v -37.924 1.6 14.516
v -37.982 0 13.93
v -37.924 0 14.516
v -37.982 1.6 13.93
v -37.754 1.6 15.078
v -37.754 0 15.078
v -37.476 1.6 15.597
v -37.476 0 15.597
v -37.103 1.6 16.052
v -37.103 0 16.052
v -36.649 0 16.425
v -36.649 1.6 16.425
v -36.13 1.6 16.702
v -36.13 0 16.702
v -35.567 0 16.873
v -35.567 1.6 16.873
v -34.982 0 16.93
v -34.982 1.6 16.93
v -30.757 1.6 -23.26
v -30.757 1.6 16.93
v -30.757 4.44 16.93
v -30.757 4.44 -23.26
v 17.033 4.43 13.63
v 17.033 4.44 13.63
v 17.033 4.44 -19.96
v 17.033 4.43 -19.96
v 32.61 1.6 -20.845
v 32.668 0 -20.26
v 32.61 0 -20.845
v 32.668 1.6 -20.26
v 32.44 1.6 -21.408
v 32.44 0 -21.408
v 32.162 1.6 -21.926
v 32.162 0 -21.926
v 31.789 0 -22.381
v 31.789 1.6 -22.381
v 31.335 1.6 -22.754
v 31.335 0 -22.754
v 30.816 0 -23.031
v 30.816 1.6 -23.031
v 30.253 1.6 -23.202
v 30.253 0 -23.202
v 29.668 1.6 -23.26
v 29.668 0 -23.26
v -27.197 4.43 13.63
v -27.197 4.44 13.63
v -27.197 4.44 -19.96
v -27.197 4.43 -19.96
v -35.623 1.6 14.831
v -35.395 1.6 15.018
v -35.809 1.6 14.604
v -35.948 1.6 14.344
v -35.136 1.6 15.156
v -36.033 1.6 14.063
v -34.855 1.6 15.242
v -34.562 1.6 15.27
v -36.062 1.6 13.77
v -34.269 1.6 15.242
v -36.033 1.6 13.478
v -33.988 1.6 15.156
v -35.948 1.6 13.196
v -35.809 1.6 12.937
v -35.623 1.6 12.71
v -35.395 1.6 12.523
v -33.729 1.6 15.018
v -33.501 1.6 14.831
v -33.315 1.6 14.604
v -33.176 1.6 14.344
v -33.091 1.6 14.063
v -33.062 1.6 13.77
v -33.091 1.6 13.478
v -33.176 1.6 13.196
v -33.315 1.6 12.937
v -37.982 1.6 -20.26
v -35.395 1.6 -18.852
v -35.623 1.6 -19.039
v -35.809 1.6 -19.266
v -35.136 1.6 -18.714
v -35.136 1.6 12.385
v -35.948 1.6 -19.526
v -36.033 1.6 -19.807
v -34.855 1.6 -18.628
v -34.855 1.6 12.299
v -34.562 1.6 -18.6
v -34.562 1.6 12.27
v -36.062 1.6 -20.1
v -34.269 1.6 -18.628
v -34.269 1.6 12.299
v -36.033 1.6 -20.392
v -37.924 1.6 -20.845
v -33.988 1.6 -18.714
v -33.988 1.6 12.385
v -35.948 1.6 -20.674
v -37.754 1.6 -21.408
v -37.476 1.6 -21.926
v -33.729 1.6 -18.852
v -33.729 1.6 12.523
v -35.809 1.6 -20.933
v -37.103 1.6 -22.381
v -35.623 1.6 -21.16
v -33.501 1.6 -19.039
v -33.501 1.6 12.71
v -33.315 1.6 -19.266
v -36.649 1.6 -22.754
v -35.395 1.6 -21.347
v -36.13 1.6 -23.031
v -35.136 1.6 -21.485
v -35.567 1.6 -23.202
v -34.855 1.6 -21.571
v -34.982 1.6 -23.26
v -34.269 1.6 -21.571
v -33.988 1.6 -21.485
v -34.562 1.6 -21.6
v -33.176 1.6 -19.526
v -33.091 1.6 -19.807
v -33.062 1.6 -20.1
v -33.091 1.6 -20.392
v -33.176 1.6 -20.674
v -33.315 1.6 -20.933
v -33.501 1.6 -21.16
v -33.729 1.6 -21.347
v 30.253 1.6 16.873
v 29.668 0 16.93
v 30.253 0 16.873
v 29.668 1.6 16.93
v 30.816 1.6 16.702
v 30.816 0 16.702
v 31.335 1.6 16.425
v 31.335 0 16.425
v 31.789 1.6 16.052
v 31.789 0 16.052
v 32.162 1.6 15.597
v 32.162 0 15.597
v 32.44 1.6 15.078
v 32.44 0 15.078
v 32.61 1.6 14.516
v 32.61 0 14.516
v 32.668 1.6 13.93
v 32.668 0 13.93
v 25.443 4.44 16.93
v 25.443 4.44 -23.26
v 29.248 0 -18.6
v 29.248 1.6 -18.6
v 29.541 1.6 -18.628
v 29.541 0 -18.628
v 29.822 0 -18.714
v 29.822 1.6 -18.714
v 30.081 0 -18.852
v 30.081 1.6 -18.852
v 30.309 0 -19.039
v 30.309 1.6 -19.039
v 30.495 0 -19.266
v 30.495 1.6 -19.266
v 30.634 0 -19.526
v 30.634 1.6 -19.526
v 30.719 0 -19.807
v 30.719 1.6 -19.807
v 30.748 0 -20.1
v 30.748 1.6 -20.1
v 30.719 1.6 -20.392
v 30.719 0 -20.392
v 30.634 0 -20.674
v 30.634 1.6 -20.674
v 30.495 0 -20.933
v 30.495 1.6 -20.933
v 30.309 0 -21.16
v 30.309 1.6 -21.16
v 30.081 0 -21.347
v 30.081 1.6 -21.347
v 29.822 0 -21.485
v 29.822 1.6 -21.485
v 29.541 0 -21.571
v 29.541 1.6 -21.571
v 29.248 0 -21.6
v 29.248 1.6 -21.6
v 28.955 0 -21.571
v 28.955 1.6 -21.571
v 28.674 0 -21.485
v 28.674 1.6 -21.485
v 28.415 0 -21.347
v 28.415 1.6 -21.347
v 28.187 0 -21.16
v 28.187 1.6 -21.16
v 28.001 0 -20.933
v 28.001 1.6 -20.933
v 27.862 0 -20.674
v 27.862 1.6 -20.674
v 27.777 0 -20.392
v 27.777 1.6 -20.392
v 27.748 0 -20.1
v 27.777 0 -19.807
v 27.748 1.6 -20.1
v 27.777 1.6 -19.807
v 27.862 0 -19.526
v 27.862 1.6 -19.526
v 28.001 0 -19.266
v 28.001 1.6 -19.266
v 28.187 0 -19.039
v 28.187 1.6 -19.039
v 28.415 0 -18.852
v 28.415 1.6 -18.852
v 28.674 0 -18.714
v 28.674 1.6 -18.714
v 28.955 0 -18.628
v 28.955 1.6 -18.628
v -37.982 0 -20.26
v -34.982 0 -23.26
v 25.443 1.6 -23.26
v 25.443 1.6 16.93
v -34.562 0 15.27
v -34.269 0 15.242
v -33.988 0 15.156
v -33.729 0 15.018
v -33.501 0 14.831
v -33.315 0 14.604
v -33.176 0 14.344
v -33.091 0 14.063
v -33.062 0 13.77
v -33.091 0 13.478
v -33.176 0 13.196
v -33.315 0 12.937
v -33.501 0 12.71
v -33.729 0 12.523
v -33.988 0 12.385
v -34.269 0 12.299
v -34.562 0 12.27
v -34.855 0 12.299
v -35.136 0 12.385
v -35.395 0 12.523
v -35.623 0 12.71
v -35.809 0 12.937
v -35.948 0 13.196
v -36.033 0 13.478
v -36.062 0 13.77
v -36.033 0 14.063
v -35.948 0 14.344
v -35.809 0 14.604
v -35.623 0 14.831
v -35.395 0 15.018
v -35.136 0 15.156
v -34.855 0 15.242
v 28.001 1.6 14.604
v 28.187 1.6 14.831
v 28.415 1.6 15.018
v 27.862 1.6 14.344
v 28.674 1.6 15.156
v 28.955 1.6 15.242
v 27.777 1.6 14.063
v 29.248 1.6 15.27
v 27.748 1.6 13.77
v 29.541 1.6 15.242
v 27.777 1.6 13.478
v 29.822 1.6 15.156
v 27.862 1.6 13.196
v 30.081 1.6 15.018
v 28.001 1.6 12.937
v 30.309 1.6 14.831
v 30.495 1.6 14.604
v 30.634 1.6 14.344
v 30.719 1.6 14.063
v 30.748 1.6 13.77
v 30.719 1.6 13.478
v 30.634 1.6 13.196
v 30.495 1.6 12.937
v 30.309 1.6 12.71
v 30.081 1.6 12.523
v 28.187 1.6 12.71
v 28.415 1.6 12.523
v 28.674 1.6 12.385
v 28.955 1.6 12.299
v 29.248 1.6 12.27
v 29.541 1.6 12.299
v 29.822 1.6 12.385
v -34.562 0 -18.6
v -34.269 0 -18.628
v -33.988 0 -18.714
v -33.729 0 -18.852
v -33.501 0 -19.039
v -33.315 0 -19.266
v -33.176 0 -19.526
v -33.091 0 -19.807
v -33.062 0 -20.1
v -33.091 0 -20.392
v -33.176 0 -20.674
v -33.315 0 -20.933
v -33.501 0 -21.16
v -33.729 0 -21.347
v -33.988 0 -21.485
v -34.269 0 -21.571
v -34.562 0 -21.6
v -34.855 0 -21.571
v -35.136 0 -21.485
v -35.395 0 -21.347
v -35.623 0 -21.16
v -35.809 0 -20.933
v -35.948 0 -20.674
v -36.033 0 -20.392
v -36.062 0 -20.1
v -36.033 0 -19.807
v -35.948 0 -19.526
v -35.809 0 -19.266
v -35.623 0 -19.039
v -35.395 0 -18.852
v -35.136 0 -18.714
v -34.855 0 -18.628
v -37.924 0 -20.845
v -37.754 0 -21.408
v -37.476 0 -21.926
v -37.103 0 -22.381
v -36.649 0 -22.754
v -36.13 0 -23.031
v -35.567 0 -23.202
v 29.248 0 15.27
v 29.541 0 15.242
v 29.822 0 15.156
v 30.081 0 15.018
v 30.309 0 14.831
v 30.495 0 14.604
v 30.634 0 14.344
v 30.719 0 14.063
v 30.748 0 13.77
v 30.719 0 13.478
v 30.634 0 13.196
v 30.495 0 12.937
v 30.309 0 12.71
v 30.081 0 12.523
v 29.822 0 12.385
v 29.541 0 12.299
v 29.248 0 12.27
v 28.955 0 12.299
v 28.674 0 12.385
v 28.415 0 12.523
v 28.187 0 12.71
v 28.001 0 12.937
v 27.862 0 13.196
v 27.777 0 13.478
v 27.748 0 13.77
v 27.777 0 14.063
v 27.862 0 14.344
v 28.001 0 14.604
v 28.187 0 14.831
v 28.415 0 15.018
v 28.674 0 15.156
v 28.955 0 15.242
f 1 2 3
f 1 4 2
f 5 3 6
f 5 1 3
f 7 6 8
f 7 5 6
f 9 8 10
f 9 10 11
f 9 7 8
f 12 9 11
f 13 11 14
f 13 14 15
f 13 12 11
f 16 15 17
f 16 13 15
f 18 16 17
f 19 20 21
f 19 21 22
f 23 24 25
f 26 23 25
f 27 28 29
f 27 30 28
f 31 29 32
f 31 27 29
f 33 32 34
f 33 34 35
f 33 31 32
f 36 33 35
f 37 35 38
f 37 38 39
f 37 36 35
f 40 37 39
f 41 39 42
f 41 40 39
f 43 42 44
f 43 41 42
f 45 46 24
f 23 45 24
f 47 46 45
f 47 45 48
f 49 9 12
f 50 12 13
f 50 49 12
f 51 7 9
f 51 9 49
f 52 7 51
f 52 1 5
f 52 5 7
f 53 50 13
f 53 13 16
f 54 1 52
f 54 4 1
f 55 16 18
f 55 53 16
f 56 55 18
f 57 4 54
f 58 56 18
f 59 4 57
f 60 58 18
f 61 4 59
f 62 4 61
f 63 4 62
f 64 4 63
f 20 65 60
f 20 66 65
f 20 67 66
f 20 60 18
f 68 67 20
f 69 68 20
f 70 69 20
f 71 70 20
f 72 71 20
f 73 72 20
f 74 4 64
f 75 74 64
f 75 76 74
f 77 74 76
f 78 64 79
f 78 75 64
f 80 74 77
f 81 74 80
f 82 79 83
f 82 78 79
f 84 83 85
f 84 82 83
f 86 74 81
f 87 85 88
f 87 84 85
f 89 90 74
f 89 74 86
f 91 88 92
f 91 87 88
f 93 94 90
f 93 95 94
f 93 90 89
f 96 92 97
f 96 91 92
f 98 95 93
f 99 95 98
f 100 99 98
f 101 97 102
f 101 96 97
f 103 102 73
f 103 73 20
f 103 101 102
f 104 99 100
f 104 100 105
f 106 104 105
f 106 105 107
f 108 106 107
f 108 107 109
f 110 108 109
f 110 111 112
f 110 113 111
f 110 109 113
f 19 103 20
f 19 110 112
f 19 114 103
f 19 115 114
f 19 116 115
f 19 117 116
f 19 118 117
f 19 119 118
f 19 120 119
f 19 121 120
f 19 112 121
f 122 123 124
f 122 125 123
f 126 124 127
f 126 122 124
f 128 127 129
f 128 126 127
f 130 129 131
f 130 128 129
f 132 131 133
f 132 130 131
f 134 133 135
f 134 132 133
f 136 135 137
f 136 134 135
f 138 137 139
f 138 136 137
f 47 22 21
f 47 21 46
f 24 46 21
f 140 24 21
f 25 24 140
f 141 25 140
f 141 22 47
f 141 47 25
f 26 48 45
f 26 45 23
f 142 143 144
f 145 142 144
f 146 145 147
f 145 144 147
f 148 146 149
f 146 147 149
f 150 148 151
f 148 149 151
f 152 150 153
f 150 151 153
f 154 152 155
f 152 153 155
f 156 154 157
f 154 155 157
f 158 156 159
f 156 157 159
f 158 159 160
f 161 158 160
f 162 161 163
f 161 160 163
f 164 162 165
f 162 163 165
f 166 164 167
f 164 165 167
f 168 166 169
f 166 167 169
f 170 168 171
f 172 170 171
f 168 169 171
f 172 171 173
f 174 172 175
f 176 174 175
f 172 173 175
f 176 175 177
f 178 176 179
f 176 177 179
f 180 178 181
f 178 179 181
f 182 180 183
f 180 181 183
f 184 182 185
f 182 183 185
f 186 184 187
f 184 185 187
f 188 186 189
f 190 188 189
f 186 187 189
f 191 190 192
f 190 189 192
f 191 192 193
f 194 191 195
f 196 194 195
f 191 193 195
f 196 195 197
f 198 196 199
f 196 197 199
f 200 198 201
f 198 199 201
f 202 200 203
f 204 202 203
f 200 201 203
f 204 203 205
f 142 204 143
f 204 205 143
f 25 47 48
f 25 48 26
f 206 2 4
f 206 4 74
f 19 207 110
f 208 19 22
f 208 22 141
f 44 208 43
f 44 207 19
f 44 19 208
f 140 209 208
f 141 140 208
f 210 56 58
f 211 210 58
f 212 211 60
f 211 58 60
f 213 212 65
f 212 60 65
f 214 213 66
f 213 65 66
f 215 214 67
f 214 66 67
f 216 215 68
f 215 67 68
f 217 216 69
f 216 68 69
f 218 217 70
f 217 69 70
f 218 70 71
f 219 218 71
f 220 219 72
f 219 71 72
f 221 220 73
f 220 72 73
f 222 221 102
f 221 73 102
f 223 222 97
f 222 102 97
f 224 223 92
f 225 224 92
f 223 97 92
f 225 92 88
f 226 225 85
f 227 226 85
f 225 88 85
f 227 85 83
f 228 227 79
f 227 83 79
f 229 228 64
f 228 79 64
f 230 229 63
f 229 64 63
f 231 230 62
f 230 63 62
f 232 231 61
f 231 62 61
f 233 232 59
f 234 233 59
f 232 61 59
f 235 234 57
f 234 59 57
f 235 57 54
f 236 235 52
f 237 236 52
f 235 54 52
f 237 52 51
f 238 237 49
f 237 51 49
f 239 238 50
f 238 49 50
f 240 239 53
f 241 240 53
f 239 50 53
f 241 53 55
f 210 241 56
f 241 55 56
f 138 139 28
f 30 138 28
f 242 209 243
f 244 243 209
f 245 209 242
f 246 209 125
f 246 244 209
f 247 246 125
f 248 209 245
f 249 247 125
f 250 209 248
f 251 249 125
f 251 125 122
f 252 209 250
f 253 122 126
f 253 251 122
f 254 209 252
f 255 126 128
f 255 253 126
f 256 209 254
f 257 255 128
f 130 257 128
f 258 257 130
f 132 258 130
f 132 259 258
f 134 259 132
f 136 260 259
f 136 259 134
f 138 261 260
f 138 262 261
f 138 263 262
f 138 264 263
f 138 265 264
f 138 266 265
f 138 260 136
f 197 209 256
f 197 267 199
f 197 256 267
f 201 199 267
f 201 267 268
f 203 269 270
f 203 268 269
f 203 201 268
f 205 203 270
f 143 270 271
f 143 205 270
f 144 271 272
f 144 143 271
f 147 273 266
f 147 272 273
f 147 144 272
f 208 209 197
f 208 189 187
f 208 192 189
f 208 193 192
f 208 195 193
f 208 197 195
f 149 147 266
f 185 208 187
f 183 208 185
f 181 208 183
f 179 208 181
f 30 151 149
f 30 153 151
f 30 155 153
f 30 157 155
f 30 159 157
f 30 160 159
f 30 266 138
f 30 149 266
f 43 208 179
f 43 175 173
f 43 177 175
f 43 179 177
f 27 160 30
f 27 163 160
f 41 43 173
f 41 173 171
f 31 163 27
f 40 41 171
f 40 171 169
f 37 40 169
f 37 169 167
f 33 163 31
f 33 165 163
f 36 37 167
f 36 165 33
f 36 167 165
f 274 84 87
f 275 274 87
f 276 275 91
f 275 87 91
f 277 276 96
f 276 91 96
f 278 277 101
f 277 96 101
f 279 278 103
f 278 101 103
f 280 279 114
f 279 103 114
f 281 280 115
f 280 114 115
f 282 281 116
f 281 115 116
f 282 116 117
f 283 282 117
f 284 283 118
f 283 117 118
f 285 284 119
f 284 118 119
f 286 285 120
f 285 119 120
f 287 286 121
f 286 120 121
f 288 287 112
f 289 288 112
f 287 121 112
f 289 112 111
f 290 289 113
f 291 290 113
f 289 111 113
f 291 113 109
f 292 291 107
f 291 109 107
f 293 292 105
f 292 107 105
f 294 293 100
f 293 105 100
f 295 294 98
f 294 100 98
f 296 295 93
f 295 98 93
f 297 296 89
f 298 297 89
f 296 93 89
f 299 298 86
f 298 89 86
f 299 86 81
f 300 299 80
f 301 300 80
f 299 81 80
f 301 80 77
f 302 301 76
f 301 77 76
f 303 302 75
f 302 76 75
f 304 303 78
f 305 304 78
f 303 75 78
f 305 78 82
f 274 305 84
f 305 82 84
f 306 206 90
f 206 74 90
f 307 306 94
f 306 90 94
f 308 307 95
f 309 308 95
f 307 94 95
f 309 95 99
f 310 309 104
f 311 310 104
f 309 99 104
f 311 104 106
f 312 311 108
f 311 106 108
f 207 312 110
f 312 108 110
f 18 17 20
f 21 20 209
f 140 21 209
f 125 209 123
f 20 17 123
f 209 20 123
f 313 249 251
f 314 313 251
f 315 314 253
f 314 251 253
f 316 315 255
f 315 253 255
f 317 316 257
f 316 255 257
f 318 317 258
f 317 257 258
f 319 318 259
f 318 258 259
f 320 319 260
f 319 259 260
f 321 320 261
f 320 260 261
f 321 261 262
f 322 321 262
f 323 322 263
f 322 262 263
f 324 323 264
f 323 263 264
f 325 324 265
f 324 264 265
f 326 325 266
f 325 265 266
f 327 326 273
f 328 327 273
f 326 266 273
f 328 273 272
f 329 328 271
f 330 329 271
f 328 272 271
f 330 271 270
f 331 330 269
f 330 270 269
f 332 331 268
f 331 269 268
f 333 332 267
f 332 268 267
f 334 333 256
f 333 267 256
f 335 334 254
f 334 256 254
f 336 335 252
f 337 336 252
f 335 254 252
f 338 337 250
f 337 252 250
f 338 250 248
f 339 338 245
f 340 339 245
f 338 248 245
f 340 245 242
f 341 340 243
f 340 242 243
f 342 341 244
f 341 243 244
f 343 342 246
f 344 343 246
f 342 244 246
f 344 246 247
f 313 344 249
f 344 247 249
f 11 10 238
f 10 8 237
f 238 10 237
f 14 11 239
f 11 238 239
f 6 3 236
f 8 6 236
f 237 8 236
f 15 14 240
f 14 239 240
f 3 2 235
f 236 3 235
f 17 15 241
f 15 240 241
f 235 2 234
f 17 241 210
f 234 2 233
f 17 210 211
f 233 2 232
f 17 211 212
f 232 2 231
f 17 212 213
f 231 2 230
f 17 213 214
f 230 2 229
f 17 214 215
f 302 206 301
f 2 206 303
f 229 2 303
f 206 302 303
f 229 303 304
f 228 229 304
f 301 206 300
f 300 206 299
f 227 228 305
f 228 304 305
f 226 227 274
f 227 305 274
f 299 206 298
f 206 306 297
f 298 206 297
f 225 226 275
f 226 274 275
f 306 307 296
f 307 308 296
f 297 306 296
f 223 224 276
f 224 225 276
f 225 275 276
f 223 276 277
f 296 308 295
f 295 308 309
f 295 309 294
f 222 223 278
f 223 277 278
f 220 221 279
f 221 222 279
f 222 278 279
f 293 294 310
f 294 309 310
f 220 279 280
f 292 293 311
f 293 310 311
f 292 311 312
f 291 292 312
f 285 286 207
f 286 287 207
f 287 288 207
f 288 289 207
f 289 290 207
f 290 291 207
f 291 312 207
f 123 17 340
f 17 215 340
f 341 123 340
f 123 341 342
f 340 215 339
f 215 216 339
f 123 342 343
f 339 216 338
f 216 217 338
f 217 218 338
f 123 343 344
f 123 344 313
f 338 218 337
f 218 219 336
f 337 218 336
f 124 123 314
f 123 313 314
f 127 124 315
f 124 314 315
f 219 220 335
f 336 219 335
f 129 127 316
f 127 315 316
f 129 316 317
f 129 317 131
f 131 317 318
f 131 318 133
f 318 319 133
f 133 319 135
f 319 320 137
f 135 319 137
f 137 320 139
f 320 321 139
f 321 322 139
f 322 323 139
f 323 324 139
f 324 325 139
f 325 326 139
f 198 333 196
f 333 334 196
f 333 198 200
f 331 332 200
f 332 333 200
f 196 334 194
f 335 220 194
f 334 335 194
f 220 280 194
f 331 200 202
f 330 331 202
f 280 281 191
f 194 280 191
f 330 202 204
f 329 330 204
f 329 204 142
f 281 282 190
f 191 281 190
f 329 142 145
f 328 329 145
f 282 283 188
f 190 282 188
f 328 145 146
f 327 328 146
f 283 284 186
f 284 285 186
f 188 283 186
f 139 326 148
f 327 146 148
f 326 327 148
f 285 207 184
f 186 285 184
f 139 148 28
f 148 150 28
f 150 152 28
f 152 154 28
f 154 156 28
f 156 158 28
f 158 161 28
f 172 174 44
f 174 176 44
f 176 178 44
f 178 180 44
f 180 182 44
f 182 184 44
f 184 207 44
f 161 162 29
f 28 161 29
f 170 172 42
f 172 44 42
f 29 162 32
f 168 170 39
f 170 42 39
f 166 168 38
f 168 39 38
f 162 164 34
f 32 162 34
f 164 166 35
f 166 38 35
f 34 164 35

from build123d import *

# Parameters (mm, degrees)
SKETCH_1_W          = 70.65
SKETCH_1_H          = 40.19
EXTRUDE_1_DEPTH     = 1.6
FILLET_1_R          = 3
SKETCH_2_R          = 1.5
CUT_EXTRUDE_1_DEPTH = 1.6
SKETCH_3_W          = 56.2
SKETCH_3_H          = 40.19
EXTRUDE_2_DEPTH     = 2.84
SKETCH_4_W          = 44.23
SKETCH_4_H          = 33.59
CUT_EXTRUDE_2_DEPTH = 0.01


with BuildPart() as part:
    # 草圖1 → 填料-伸長1 (new body)
    with BuildSketch(Plane(origin=(0, 0, 0), x_dir=(1, 0, 0), z_dir=(0, 1, 0))):
        with Locations((-2.656997534, 3.164617756)):
            Rectangle(SKETCH_1_W, SKETCH_1_H)
    extrude(amount=EXTRUDE_1_DEPTH)

    # 圓角1
    fillet_1_edges = [part.edges().sort_by_distance(p)[0] for p in [
        (-37.981997534, 0.8, -23.259617756),
        (32.668002466, 0.8, -23.259617756),
        (32.668002466, 0.8, 16.930382244),
        (-37.981997534, 0.8, 16.930382244),
    ]]
    fillet(fillet_1_edges, radius=FILLET_1_R)

    # 草圖2 → 除料-伸長1 (cut)
    with BuildSketch(Plane(origin=(0, 1.6, 0), x_dir=(1, 0, 0), z_dir=(0, 1, 0))):
        with Locations(Location((-34.561997534, 20.099617756, 0), (0, 0, 270))):
            Circle(SKETCH_2_R)
        with Locations(Location((29.248002466, 20.099617756, 0), (0, 0, 270))):
            Circle(SKETCH_2_R)
        with Locations(Location((-34.561997534, -13.770382244, 0), (0, 0, 270))):
            Circle(SKETCH_2_R)
        with Locations(Location((29.248002466, -13.770382244, 0), (0, 0, 270))):
            Circle(SKETCH_2_R)
    extrude(amount=-CUT_EXTRUDE_1_DEPTH, mode=Mode.SUBTRACT)

    # 草圖3 → 填料-伸長2 (add)
    with BuildSketch(Plane(origin=(0, 1.6, 0), x_dir=(1, 0, 0), z_dir=(0, 1, 0))):
        with Locations((-2.656997534, 3.164617756)):
            Rectangle(SKETCH_3_W, SKETCH_3_H)
    extrude(amount=EXTRUDE_2_DEPTH)

    # 草圖4 → 除料-伸長2 (cut)
    with BuildSketch(Plane(origin=(0, 4.44, 0), x_dir=(1, 0, 0), z_dir=(0, 1, 0))):
        with Locations((-5.081997534, 3.164617756)):
            Rectangle(SKETCH_4_W, SKETCH_4_H)
    extrude(amount=-CUT_EXTRUDE_2_DEPTH, mode=Mode.SUBTRACT)


solid = part.part
